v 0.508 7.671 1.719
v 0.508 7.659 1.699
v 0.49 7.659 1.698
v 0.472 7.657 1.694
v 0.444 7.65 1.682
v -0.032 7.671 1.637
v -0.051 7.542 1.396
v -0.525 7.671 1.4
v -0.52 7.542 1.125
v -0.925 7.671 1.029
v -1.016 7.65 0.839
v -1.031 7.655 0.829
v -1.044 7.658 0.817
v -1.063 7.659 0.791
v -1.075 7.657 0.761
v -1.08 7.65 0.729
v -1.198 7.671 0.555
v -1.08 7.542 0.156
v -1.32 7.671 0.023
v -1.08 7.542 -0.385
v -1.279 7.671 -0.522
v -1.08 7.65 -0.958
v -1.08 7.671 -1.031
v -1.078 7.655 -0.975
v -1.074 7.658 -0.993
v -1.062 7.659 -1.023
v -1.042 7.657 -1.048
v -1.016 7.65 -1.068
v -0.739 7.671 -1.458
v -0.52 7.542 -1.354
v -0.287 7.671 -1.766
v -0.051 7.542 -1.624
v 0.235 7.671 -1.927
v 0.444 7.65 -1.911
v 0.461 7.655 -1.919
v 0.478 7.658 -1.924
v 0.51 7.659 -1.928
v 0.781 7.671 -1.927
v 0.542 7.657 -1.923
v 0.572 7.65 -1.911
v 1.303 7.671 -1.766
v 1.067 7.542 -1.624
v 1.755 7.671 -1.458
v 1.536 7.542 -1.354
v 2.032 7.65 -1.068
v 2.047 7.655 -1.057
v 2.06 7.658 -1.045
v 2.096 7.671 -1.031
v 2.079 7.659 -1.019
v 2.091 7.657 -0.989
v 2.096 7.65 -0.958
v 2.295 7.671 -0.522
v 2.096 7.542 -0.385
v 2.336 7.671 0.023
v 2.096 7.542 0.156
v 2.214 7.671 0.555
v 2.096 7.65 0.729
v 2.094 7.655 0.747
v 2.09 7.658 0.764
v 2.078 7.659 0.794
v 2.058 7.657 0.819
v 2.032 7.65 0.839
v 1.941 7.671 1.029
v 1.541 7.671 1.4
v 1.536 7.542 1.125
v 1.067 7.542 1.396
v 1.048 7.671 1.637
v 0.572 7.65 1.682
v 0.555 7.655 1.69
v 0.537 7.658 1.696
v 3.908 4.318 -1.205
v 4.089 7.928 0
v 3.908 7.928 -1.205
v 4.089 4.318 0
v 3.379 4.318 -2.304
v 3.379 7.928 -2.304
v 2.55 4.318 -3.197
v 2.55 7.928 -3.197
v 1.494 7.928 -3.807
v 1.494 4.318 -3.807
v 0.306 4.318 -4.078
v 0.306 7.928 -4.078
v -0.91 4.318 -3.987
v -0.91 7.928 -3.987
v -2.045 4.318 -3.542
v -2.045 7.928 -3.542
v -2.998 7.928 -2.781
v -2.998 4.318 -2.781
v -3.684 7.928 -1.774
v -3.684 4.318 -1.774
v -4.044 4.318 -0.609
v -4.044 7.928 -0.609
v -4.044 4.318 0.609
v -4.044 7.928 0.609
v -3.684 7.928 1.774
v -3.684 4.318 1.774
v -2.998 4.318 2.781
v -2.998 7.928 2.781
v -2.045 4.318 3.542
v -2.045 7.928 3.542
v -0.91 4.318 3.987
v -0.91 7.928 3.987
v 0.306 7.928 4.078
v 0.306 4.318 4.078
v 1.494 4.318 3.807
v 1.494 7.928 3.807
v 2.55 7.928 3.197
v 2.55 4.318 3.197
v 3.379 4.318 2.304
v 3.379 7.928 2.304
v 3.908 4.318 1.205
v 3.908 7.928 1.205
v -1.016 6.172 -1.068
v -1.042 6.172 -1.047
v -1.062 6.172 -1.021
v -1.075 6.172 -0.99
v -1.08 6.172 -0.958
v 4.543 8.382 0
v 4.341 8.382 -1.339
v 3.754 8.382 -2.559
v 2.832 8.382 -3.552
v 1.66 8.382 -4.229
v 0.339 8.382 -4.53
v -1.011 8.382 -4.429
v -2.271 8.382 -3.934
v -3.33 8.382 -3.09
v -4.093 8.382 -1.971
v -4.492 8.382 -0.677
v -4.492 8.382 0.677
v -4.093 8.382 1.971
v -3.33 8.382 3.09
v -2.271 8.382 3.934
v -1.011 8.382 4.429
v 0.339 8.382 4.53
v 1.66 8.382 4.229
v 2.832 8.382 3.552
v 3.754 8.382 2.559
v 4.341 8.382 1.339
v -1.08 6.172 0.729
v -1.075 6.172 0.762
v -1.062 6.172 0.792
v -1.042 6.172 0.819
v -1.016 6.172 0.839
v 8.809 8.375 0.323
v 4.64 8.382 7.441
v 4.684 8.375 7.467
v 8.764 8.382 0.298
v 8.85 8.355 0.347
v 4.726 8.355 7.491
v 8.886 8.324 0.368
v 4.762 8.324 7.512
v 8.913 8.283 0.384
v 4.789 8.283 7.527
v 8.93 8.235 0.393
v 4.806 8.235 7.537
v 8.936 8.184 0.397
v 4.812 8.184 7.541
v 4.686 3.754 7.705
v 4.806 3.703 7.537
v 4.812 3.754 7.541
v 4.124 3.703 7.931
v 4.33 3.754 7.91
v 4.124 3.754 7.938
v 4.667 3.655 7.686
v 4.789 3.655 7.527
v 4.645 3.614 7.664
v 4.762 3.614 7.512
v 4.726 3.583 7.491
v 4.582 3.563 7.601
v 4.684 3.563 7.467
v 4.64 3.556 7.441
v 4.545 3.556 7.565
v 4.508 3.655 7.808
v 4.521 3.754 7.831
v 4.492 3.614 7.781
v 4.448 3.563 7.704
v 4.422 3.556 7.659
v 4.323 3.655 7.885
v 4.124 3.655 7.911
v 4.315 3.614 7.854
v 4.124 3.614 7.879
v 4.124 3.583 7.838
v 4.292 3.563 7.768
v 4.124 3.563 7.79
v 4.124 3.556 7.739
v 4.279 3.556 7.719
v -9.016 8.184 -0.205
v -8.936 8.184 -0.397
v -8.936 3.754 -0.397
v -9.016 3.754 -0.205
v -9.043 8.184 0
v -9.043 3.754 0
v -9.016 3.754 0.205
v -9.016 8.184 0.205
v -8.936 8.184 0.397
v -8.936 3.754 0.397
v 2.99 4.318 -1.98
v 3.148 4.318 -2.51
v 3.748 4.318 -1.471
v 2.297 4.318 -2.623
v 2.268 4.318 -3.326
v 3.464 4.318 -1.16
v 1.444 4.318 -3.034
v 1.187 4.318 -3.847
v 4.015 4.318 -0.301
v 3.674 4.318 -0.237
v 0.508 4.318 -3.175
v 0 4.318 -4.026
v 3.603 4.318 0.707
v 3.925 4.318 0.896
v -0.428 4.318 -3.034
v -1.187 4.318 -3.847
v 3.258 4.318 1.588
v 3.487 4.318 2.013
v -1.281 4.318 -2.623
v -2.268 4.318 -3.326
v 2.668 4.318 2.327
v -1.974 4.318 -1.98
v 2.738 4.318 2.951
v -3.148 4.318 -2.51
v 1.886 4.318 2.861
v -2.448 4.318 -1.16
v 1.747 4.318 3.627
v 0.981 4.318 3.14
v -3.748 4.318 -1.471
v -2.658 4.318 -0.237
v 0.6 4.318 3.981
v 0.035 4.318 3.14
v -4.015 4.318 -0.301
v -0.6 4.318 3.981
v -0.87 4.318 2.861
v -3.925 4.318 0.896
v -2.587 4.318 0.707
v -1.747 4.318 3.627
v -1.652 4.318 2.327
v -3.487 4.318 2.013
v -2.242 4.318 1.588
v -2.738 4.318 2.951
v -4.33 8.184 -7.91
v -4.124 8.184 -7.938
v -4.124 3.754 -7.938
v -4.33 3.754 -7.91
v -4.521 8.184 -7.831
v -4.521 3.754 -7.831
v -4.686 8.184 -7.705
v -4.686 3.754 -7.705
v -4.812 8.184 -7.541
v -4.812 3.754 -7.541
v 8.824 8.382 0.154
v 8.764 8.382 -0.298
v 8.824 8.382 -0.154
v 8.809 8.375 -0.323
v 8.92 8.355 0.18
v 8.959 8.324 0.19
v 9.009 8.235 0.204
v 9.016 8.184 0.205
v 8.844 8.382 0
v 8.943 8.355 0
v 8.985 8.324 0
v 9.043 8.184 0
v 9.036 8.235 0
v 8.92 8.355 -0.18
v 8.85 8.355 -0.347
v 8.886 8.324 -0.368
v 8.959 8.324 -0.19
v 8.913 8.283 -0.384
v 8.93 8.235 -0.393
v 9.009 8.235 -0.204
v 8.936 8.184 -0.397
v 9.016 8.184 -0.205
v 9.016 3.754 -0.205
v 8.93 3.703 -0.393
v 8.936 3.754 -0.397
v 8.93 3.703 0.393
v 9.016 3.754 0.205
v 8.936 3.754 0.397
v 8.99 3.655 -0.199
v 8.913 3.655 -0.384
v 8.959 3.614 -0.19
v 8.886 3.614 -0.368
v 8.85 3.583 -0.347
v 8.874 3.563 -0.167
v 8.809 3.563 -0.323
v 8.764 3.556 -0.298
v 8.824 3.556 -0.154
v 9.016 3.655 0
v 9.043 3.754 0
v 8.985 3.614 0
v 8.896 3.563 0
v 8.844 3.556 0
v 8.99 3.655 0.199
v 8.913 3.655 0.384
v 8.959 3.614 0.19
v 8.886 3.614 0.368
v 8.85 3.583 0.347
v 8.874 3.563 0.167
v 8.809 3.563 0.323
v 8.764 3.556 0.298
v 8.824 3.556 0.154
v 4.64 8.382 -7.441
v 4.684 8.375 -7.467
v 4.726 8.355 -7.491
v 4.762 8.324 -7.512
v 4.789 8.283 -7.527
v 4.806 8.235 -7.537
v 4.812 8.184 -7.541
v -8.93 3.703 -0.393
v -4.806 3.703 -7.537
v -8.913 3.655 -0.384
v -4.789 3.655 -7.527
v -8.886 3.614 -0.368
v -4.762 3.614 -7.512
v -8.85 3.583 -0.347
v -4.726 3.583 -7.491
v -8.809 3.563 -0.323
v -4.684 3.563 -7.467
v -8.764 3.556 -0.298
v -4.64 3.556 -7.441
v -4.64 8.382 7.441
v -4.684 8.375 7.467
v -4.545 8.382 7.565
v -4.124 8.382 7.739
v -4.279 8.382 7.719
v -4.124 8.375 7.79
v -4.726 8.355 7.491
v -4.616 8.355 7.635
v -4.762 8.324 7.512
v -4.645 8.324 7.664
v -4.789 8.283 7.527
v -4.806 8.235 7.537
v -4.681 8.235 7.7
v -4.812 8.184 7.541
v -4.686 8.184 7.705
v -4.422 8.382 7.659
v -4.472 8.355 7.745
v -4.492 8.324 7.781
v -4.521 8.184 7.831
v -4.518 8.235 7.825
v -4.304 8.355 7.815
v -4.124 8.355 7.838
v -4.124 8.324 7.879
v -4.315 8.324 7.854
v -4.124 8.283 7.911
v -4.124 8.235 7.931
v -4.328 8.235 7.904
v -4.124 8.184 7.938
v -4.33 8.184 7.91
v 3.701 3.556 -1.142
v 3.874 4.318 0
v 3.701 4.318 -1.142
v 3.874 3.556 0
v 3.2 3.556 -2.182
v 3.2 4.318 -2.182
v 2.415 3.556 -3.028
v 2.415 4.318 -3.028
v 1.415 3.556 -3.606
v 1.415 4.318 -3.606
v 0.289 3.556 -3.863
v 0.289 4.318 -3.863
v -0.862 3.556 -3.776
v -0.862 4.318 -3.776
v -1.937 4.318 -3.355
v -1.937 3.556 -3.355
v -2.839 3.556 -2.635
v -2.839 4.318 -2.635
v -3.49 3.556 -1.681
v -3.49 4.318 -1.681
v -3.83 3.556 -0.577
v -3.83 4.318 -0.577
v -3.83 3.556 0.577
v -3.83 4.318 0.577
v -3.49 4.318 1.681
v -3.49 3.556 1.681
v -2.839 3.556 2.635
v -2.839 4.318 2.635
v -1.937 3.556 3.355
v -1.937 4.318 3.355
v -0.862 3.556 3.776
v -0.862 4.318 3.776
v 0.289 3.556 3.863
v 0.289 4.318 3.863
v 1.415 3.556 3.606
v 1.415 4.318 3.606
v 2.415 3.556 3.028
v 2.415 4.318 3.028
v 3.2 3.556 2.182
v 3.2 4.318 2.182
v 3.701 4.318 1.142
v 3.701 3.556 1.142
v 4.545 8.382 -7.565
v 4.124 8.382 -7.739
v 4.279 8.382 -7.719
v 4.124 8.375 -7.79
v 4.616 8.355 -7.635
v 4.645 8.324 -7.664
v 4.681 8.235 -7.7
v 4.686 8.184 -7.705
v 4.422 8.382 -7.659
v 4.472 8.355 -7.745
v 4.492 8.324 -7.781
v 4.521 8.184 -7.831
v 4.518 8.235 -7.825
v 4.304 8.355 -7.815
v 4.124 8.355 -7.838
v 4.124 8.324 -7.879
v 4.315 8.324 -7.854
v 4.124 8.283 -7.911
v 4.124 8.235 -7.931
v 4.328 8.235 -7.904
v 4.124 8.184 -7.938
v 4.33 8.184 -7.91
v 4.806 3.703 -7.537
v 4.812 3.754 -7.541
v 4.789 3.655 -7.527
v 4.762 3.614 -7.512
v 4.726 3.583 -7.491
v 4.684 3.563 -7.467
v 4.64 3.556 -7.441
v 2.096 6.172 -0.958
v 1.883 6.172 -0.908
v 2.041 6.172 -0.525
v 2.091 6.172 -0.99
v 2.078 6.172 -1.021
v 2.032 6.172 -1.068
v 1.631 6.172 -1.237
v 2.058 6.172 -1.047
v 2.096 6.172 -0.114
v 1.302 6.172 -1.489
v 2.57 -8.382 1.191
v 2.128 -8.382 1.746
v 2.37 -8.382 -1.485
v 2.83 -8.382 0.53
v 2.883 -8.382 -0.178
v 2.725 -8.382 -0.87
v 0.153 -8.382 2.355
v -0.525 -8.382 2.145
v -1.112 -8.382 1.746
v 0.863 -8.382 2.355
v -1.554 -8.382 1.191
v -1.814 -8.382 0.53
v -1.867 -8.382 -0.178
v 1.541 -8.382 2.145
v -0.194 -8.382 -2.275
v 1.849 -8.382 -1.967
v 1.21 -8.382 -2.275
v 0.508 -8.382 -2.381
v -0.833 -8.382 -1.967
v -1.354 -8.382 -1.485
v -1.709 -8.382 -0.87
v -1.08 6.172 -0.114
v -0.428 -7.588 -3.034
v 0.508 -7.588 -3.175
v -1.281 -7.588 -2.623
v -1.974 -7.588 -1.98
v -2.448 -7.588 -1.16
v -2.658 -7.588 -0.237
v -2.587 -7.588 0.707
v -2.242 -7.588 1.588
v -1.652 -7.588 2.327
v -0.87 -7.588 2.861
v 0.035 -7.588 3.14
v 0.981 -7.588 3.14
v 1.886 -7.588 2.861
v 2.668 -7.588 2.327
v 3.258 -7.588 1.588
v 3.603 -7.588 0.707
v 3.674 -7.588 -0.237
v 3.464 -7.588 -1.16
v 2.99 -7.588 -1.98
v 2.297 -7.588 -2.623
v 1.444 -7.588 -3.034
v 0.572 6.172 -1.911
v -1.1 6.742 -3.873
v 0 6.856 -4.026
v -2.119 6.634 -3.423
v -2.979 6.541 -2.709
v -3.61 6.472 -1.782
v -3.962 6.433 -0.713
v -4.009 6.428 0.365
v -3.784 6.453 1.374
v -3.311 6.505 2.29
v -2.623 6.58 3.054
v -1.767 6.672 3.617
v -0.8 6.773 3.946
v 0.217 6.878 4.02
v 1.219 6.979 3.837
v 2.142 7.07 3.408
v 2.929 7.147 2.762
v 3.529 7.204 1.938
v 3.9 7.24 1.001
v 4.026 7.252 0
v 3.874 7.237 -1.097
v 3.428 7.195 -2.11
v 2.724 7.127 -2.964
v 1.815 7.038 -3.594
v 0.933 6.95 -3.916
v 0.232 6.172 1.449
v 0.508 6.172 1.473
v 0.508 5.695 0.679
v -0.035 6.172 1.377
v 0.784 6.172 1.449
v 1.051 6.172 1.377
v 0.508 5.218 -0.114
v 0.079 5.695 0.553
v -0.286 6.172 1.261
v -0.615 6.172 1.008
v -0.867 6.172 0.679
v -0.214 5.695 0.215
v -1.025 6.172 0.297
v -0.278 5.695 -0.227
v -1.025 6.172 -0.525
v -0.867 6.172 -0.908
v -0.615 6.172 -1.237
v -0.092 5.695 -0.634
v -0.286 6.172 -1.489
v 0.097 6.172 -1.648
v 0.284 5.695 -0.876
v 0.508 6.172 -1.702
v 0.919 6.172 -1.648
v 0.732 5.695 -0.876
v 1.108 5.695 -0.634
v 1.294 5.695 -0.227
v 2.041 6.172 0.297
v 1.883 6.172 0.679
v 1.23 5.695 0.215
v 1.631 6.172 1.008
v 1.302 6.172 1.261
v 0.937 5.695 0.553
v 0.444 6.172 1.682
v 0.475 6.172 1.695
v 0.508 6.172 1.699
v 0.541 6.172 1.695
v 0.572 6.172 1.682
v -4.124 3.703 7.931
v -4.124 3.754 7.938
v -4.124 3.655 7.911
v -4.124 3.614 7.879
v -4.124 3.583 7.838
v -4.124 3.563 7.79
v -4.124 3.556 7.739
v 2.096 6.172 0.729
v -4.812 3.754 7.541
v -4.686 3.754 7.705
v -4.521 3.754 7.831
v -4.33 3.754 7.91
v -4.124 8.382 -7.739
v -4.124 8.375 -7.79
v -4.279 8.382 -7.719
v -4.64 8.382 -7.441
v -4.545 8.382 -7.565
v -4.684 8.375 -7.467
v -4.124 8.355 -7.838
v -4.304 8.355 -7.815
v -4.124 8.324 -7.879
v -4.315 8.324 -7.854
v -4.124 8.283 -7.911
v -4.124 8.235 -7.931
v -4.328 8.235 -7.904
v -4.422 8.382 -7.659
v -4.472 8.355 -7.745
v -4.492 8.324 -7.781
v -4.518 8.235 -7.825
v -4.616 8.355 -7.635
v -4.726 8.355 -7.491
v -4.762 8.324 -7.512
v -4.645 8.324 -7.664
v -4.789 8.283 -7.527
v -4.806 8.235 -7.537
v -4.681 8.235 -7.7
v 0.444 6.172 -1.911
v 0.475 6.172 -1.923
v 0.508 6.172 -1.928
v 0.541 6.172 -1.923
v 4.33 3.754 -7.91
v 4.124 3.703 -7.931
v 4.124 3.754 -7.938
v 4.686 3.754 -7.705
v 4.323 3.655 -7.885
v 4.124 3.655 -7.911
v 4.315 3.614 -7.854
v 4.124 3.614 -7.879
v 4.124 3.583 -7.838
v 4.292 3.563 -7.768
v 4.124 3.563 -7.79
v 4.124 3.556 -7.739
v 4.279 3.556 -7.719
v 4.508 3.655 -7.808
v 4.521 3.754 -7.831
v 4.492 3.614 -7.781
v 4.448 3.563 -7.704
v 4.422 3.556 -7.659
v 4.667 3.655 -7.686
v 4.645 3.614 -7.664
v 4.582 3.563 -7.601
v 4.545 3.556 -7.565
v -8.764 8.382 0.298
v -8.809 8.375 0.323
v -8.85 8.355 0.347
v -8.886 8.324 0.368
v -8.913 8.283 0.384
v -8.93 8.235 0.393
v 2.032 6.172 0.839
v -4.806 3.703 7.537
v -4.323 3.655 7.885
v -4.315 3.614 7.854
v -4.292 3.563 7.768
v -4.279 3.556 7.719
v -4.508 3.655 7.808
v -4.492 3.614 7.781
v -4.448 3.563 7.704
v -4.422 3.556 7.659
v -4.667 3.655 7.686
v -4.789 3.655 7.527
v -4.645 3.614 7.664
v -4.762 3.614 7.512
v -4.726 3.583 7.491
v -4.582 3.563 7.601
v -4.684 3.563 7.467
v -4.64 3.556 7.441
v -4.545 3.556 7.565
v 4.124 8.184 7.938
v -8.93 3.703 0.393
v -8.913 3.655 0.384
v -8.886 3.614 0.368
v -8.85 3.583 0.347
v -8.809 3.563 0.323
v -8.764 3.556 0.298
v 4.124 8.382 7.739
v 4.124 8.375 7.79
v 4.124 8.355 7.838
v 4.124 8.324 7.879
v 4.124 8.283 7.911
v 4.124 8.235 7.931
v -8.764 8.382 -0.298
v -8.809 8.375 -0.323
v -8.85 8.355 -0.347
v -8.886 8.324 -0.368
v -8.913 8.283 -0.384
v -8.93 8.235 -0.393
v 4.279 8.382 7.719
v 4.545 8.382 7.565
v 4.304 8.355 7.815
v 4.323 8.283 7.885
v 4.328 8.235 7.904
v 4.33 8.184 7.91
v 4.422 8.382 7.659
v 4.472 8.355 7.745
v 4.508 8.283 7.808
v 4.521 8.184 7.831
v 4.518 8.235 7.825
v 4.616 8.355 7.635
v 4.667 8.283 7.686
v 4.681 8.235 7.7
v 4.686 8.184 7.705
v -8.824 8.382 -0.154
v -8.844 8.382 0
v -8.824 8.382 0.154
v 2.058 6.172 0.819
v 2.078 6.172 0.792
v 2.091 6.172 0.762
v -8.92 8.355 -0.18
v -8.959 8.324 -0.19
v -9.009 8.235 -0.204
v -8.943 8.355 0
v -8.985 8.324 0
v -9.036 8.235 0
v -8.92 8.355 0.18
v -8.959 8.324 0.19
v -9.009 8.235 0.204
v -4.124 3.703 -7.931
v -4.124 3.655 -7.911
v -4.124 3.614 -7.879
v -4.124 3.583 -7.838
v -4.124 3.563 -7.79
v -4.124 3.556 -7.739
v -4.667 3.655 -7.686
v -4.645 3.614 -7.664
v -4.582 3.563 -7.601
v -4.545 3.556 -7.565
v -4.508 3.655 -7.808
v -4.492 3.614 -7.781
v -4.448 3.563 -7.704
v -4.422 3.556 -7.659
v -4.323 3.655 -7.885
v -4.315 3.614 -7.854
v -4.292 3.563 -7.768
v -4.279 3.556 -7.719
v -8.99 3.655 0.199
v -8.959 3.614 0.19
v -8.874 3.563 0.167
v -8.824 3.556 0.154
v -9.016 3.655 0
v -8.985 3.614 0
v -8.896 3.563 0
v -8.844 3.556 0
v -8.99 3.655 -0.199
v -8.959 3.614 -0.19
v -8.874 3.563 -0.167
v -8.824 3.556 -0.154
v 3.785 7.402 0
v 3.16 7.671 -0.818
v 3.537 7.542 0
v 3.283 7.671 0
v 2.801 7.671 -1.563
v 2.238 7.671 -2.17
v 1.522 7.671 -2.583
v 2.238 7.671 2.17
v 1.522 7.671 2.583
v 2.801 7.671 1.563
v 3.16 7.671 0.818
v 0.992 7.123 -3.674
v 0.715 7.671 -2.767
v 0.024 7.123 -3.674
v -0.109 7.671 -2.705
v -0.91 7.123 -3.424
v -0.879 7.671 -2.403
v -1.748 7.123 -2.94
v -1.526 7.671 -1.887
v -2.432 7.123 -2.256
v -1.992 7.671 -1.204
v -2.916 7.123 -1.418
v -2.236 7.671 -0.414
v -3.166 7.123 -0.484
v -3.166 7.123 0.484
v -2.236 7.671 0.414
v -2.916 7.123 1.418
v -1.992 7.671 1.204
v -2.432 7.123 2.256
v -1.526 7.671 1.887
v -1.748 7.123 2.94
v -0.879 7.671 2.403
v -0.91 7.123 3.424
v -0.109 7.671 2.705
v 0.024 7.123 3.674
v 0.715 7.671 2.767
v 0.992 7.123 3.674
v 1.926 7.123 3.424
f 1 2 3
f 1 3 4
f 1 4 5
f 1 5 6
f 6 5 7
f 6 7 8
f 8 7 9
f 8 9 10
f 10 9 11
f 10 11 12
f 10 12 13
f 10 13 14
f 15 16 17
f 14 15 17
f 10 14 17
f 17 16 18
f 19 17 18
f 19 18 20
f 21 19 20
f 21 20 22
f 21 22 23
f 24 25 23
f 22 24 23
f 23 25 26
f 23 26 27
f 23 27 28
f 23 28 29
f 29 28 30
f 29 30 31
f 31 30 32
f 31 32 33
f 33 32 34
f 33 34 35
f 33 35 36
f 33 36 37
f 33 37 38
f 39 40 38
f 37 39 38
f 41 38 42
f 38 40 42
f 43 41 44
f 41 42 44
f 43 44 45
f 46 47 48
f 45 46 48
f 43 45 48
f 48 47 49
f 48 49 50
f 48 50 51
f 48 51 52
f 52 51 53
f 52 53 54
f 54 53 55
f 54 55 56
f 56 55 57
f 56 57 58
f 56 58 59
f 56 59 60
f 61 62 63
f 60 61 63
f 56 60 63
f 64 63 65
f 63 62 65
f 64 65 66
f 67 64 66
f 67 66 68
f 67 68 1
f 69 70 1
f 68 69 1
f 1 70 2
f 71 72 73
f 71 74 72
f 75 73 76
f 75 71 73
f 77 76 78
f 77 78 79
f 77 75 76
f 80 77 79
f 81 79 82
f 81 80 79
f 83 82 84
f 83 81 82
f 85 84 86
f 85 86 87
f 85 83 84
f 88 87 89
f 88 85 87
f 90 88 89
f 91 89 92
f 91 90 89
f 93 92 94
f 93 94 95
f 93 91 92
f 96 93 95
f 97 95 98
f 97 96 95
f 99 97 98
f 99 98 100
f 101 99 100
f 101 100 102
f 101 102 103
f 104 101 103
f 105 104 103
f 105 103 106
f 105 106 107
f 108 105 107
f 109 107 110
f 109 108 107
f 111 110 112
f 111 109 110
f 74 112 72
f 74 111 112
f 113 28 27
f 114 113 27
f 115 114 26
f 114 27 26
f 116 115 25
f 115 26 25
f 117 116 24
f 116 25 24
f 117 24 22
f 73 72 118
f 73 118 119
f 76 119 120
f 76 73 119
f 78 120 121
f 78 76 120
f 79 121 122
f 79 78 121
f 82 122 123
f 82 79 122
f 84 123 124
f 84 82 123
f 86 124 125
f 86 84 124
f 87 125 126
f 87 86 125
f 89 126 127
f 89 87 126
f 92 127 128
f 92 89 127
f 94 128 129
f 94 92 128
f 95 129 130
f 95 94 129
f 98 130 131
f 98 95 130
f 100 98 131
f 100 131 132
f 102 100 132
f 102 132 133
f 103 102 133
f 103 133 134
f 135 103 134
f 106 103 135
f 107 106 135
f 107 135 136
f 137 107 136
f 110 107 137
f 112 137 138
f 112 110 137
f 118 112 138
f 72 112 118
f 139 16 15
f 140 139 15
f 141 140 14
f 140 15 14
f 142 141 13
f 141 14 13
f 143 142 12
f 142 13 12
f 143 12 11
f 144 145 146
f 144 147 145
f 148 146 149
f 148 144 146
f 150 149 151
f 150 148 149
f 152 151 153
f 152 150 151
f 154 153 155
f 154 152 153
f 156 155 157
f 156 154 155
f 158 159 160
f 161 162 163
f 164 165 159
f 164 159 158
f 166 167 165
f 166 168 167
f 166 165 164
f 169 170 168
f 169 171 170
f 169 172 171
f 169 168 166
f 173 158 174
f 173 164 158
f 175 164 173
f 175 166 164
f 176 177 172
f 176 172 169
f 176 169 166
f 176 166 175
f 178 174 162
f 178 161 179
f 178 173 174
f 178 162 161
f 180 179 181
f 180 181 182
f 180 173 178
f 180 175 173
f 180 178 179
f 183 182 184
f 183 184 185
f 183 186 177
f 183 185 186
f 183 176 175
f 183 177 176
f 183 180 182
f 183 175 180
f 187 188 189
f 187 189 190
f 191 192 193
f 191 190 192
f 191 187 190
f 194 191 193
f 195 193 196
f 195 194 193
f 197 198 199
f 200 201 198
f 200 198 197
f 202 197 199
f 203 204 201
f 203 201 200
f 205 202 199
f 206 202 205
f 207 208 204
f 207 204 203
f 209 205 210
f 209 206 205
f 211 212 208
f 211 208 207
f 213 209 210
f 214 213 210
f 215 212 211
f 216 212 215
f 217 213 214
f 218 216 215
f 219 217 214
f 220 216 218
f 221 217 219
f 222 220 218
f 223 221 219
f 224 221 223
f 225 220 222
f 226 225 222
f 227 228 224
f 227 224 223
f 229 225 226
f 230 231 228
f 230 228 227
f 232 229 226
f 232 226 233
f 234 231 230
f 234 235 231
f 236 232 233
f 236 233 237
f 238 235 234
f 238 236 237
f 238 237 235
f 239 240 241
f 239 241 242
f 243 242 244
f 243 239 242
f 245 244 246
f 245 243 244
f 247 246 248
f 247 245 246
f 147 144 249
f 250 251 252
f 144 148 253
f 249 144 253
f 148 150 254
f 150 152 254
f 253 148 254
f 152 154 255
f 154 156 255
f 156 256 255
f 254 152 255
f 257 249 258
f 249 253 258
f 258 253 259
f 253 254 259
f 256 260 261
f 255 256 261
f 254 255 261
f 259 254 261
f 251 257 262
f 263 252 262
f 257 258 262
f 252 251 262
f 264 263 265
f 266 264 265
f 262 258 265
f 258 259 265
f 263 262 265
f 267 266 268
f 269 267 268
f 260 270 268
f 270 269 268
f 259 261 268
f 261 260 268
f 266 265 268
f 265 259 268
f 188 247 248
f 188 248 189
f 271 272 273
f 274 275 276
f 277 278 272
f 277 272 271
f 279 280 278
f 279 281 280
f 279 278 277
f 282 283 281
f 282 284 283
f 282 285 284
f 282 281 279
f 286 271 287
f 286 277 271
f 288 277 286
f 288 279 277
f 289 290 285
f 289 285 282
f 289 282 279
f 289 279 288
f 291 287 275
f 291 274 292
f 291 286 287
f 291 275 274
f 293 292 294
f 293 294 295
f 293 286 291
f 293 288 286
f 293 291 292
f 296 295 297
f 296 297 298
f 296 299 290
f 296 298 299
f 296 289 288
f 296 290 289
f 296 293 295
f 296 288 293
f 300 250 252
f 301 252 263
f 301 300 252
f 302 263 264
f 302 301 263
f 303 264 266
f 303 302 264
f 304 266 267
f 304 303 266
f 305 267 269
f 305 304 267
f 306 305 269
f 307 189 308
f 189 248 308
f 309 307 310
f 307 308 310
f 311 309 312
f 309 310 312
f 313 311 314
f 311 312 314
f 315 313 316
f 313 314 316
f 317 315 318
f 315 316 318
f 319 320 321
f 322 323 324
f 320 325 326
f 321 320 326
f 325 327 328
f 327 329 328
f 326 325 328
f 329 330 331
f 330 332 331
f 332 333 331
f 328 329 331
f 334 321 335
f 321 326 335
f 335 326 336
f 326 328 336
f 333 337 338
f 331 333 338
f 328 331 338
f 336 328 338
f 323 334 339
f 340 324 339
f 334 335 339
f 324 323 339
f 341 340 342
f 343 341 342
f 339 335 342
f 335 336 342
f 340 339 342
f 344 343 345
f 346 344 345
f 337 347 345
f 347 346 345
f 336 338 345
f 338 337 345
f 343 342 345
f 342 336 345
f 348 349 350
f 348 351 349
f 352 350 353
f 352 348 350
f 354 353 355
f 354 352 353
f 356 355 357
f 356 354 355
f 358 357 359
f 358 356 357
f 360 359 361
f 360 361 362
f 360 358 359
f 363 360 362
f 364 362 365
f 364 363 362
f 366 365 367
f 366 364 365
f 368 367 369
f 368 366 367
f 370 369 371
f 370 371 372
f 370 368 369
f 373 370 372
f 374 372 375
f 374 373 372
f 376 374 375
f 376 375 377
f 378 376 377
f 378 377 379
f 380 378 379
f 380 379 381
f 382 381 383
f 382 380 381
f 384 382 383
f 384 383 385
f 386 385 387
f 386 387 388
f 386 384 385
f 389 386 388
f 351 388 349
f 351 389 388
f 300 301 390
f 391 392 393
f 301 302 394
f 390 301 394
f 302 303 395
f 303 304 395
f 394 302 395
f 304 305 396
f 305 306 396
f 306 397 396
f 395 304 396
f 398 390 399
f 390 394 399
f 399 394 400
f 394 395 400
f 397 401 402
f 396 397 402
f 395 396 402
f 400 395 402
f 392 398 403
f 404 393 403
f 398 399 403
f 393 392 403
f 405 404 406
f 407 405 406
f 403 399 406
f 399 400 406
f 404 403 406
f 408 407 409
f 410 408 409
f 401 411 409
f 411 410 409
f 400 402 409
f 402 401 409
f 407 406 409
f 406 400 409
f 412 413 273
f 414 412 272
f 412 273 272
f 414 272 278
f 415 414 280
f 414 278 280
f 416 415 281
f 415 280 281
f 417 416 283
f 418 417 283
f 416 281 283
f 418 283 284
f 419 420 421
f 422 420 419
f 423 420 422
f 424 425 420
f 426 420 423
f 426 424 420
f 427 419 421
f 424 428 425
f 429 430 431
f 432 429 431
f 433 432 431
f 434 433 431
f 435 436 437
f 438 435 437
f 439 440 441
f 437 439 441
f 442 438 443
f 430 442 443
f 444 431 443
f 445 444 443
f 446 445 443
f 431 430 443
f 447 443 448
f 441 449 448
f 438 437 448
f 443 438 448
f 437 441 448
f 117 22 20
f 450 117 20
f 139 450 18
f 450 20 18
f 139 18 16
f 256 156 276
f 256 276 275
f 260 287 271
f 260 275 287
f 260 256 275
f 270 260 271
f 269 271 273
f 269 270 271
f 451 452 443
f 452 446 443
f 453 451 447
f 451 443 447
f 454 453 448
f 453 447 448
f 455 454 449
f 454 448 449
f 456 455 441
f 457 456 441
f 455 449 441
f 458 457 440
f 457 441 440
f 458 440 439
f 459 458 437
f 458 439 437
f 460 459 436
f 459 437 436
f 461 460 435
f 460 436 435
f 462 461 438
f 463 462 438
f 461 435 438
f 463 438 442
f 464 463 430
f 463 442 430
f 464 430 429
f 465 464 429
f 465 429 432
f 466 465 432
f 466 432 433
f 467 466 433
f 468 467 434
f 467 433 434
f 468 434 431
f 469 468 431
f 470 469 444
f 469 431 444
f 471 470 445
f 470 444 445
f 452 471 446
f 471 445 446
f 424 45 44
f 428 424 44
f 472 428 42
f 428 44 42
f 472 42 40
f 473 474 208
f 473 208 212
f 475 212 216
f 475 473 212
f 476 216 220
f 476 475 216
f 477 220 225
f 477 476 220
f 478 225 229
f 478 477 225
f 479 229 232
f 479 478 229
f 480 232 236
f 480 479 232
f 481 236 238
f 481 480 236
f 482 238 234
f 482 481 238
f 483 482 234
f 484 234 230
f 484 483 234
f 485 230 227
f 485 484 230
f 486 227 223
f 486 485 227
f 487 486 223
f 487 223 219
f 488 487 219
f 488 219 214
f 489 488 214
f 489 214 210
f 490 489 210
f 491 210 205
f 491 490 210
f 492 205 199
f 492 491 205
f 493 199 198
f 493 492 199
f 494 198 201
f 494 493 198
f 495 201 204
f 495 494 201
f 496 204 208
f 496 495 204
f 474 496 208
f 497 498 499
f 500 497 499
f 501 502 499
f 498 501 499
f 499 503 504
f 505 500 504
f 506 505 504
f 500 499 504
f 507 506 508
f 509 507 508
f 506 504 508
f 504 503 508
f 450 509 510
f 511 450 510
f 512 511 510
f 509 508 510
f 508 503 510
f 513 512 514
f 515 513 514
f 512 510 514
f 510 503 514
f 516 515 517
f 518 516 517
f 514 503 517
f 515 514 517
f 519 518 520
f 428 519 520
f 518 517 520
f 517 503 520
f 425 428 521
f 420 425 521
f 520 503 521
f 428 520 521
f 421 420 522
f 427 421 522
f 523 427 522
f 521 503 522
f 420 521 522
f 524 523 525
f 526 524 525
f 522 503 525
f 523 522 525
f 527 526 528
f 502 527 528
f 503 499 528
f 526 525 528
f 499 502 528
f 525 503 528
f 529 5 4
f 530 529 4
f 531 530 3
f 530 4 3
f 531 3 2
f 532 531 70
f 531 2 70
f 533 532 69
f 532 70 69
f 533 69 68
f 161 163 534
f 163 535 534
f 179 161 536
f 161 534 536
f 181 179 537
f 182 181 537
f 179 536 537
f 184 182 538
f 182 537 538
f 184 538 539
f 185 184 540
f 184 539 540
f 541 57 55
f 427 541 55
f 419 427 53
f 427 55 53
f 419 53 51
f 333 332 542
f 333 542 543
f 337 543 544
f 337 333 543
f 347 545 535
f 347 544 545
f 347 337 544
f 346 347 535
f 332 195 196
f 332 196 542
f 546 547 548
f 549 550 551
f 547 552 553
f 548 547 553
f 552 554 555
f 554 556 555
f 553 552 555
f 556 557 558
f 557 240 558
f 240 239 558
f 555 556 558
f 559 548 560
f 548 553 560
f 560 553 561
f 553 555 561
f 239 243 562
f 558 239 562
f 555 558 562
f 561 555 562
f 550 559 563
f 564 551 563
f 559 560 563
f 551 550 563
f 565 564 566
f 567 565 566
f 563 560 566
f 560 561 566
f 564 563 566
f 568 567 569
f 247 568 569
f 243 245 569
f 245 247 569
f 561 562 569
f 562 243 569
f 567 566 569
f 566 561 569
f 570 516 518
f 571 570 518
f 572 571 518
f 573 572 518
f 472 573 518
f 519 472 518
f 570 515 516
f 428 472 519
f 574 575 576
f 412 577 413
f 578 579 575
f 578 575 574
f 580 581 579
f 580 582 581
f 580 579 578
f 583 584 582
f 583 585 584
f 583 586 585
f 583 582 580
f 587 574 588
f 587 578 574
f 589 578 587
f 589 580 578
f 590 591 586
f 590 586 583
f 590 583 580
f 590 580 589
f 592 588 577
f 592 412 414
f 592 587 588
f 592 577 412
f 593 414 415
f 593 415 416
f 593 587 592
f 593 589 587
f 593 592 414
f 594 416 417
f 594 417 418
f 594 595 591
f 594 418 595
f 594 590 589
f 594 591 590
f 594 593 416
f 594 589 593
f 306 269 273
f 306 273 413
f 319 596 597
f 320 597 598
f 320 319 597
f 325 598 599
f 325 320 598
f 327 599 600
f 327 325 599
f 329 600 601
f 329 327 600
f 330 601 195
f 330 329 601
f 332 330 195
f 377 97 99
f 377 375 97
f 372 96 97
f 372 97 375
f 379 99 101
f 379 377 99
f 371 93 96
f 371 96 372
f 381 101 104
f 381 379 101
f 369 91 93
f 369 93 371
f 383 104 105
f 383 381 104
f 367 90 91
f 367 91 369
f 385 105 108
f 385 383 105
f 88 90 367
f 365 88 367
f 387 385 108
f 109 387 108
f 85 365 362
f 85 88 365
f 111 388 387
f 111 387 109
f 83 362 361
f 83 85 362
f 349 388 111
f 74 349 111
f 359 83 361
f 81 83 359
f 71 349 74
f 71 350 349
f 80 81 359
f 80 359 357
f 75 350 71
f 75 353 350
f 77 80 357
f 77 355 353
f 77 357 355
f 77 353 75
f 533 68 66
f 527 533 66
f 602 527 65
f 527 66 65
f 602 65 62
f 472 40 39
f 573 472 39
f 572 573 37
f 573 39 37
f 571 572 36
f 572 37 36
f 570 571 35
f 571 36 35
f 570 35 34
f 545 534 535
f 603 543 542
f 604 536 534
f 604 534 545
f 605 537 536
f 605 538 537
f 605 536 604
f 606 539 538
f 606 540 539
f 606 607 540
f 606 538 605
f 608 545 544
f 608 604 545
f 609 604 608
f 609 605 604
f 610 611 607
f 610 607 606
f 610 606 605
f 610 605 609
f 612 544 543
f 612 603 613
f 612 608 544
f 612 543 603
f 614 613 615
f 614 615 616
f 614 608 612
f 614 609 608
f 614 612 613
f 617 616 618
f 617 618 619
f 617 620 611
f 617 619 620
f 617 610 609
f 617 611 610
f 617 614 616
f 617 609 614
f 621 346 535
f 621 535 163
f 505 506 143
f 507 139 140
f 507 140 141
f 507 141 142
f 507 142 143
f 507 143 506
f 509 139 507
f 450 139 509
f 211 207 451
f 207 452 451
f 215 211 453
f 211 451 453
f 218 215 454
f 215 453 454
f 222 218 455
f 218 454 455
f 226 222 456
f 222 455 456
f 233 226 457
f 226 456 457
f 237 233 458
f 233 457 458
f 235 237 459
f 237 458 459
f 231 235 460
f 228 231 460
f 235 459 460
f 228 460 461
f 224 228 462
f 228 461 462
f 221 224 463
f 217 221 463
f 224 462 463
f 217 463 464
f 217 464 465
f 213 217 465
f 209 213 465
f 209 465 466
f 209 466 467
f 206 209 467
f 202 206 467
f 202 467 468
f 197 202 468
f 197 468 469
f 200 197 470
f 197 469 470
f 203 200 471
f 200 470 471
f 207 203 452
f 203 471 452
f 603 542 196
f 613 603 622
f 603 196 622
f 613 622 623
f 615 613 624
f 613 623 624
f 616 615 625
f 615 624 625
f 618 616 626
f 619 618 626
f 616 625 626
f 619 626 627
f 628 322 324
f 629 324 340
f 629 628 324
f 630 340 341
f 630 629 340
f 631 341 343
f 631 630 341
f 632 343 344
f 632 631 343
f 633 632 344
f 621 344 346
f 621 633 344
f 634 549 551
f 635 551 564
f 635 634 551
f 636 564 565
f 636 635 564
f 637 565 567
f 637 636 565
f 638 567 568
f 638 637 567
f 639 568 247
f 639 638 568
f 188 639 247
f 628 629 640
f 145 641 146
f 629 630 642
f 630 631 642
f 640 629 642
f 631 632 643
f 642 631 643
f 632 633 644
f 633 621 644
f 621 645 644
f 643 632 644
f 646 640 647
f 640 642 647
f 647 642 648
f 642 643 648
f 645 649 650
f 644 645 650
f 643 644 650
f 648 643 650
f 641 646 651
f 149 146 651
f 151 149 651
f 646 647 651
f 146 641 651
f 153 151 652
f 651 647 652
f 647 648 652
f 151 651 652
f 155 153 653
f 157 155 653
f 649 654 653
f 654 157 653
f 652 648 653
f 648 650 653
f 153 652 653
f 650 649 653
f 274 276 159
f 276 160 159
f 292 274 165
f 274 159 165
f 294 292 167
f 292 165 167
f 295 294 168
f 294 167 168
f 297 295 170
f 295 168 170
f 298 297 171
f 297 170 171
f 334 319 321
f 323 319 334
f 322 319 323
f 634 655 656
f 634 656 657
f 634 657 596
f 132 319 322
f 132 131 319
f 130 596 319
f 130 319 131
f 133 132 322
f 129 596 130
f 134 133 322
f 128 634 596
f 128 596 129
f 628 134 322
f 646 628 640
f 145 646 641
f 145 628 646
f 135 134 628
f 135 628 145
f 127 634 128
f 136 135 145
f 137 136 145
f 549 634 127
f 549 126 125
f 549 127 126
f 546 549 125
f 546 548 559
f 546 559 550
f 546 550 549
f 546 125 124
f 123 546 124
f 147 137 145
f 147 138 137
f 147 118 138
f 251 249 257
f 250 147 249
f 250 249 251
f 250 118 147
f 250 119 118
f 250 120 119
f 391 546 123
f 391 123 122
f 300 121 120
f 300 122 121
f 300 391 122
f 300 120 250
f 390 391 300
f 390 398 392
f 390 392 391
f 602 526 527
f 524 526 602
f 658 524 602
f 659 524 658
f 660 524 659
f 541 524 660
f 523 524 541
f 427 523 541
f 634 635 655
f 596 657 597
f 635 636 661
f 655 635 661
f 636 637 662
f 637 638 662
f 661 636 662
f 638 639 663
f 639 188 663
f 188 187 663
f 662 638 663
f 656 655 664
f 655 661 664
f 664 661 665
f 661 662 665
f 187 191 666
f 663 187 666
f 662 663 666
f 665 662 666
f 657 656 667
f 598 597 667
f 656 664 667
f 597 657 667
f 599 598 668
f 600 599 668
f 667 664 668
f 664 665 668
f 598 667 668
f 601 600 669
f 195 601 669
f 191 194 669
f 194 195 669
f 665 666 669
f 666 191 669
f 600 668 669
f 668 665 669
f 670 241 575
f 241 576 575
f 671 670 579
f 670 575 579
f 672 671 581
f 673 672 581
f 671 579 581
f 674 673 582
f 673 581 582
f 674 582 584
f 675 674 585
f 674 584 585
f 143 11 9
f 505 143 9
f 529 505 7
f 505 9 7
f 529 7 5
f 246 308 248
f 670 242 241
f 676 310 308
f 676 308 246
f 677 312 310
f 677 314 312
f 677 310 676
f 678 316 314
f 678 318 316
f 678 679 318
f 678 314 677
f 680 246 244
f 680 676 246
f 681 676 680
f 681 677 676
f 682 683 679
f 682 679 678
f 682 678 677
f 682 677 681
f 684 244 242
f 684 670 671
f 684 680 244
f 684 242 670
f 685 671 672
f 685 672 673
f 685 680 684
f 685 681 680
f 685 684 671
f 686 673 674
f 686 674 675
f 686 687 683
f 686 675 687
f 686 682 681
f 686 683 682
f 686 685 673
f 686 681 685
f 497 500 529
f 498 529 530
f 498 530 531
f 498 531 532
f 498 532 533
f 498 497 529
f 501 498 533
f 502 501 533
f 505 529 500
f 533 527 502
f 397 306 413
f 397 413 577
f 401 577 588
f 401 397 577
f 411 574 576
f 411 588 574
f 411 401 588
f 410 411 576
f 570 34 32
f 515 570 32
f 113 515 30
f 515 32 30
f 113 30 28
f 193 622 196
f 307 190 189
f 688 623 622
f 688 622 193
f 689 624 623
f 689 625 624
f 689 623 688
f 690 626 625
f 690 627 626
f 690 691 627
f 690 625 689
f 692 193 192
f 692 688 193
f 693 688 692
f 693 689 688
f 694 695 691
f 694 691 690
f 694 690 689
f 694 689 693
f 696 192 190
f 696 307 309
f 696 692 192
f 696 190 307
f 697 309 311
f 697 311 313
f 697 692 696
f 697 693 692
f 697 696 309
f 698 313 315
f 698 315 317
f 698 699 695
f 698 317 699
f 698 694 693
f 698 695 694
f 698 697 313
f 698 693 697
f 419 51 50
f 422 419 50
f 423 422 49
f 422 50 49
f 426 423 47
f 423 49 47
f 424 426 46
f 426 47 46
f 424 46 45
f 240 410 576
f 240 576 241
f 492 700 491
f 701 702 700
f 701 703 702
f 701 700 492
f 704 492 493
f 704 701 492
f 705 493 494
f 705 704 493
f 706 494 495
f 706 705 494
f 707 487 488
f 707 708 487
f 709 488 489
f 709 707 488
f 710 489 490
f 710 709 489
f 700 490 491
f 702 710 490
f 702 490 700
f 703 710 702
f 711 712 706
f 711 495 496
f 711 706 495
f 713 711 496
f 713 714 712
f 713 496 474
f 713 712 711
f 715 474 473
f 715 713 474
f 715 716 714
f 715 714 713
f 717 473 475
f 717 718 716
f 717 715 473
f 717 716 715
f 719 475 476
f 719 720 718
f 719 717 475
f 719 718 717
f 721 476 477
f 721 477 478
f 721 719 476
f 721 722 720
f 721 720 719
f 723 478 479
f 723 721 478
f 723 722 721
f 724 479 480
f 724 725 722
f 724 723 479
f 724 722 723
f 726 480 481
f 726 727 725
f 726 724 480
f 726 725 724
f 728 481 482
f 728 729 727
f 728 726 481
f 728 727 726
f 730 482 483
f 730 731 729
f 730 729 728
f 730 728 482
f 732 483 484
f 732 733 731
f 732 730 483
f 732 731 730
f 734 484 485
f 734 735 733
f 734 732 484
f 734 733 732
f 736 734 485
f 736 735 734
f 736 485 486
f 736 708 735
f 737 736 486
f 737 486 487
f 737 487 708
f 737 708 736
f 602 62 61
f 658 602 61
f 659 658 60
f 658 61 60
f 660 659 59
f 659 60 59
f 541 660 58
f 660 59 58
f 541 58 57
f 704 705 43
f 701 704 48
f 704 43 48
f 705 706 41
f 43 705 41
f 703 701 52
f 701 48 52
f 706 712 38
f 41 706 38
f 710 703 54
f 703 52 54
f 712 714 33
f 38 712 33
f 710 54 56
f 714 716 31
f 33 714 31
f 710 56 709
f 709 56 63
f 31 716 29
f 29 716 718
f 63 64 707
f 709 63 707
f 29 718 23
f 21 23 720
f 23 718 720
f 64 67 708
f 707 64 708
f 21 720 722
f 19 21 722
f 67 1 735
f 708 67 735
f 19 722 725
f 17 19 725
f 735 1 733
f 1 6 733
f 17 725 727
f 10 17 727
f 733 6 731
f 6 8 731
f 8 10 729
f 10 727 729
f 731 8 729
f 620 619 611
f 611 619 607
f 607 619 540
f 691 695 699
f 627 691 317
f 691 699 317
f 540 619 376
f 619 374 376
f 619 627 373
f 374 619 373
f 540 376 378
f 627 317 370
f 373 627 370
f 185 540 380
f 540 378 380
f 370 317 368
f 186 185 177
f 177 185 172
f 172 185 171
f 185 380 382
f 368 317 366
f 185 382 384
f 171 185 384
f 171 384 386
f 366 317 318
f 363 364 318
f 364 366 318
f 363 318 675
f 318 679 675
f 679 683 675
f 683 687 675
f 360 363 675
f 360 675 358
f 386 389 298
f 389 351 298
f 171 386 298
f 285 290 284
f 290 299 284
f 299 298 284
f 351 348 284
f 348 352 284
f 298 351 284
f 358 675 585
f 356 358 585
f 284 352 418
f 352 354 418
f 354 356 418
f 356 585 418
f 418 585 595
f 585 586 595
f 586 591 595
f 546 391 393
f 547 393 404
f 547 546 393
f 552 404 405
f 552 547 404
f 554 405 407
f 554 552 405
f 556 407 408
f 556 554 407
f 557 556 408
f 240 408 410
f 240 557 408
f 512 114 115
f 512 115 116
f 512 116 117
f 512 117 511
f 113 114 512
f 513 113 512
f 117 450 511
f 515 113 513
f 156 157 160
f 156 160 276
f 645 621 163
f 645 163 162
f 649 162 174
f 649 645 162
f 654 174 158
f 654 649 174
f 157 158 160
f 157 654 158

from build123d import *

# Parameters (mm, degrees)
SKETCH4_R           = 4.542971429
BOSS_EXTRUDE1_DEPTH = 4.826
FILLET1_R           = 0.1984375
SKETCH5_W           = 4.0259
SKETCH5_H           = 3.3528
CUT_EXTRUDE1_DEPTH  = 1.4986


with BuildPart() as part:
    # Sketch3 → Revolve1 (revolve)
    with BuildSketch(Plane.XY, mode=Mode.PRIVATE) as revolve1_sk:
        Polygon((-4.542971429, 8.382), (-4.0894, 7.928428571), (-4.0894, 4.318), (-3.8735, 4.318), (-3.8735, 3.556), (-7.9375, 3.556), (-7.9375, 8.382), align=None)
    revolve(revolve1_sk.sketch.rotate(Axis((0, -8.382, 0), (0, 1, 0)), 180), axis=Axis((0, -8.382, 0), (0, 1, 0)))

    # Sketch4 → Boss-Extrude1 (add)
    with BuildSketch(Plane(origin=(0, 8.382, 0), x_dir=(1, 0, 0), z_dir=(0, 1, 0))):
        with BuildLine():
            Line((4.124445986, 7.9375), (-4.124445986, 7.9375))
            ThreePointArc((-4.124445986, 7.9375), (-4.521320986, 7.831157664), (-4.81185365, 7.540625))
            Line((-4.81185365, 7.540625), (-8.936299635, 0.396875))
            ThreePointArc((-8.936299635, 0.396875), (-9.042641971, 0), (-8.936299635, -0.396875))
            Line((-8.936299635, -0.396875), (-4.81185365, -7.540625))
            ThreePointArc((-4.81185365, -7.540625), (-4.521320986, -7.831157664), (-4.124445986, -7.9375))
            Line((-4.124445986, -7.9375), (4.124445986, -7.9375))
            ThreePointArc((4.124445986, -7.9375), (4.521320986, -7.831157664), (4.81185365, -7.540625))
            Line((4.81185365, -7.540625), (8.936299635, -0.396875))
            ThreePointArc((8.936299635, -0.396875), (9.042641971, 0), (8.936299635, 0.396875))
            Line((8.936299635, 0.396875), (4.81185365, 7.540625))
            ThreePointArc((4.81185365, 7.540625), (4.521320986, 7.831157664), (4.124445986, 7.9375))
        make_face()
        Circle(SKETCH4_R, mode=Mode.SUBTRACT)
    extrude(amount=-BOSS_EXTRUDE1_DEPTH)

    # Fillet1
    fillet1_edges = [part.edges().sort_by_distance(p)[0] for p in [
        (-6.874076643, 3.556, 3.96875),
        (0, 3.556, 7.9375),
        (-4.521320986, 3.556, 7.831157664),
        (6.874076643, 3.556, 3.96875),
        (4.521320986, 3.556, 7.831157664),
        (6.874076643, 3.556, -3.96875),
        (9.042641971, 3.556, 0),
        (0, 3.556, -7.9375),
        (4.521320986, 3.556, -7.831157664),
        (-6.874076643, 3.556, -3.96875),
        (-4.521320986, 3.556, -7.831157664),
        (6.874076643, 8.382, 3.96875),
        (0, 8.382, 7.9375),
        (4.521320986, 8.382, 7.831157664),
        (-6.874076643, 8.382, 3.96875),
        (-4.521320986, 8.382, 7.831157664),
        (-6.874076643, 8.382, -3.96875),
        (-9.042641971, 8.382, 0),
        (0, 8.382, -7.9375),
        (-4.521320986, 8.382, -7.831157664),
        (6.874076643, 8.382, -3.96875),
        (4.521320986, 8.382, -7.831157664),
        (9.042641971, 8.382, 0),
        (-9.042641971, 3.556, 0),
    ]]
    fillet(fillet1_edges, radius=FILLET1_R)


with BuildPart() as body_2:
    # Sketch5 → Revolve2 (revolve)
    with BuildSketch(Plane.XY, mode=Mode.PRIVATE) as revolve2_sk:
        with Locations((2.01295, 5.9944)):
            Rectangle(SKETCH5_W, SKETCH5_H)
    revolve(revolve2_sk.sketch.rotate(Axis((0, 4.318, 0), (0, 1, 0)), 90), axis=Axis((0, 4.318, 0), (0, 1, 0)))

    # Sketch6 → Revolve3 (revolve)
    with BuildSketch(Plane.XY, mode=Mode.PRIVATE) as revolve3_sk:
        Polygon((0.508, 4.318), (3.683, 4.318), (3.683, -7.58825), (2.88925, -8.382), (0.508, -8.382), align=None)
    revolve(revolve3_sk.sketch.rotate(Axis((0.508, -8.382, 0), (0, 1, 0)), 90), axis=Axis((0.508, -8.382, 0), (0, 1, 0)))

    # Sketch7 → Cut-Revolve1 (revolve, cut)
    with BuildSketch(Plane.XY):
        with BuildLine():
            Line((6.703000764, 13.127905926), (6.703000764, 3.556))
            ThreePointArc((6.703000764, 3.556), (4.409975702, 6.979063374), (0.508, 8.301905926))
            Line((0.508, 8.301905926), (0.508, 13.127905926))
            Line((0.508, 13.127905926), (6.703000764, 13.127905926))
        make_face()
    revolve(axis=Axis((0.508, -8.382, 0), (0, 1, 0)), mode=Mode.SUBTRACT)

    # Sketch8 → Cut-Extrude1 (cut)
    with BuildSketch(Plane(origin=(0, 7.6708, 0), x_dir=(1, 0, 0), z_dir=(0, 1, 0))):
        with BuildLine():
            Line((-1.016, -0.838905294), (0.4445, -1.682125363))
            ThreePointArc((0.4445, -1.682125363), (0.508, -1.699140136), (0.5715, -1.682125363))
            Line((0.5715, -1.682125363), (2.032, -0.838905294))
            ThreePointArc((2.032, -0.838905294), (2.078485226, -0.792420068), (2.0955, -0.728920068))
            Line((2.0955, -0.728920068), (2.0955, 0.957520068))
            ThreePointArc((2.0955, 0.957520068), (2.078485226, 1.021020068), (2.032, 1.067505294))
            Line((2.032, 1.067505294), (0.5715, 1.910725363))
            ThreePointArc((0.5715, 1.910725363), (0.508, 1.927740136), (0.4445, 1.910725363))
            Line((0.4445, 1.910725363), (-1.016, 1.067505294))
            ThreePointArc((-1.016, 1.067505294), (-1.062485226, 1.021020068), (-1.0795, 0.957520068))
            Line((-1.0795, 0.957520068), (-1.0795, -0.728920068))
            ThreePointArc((-1.0795, -0.728920068), (-1.062485226, -0.792420068), (-1.016, -0.838905294))
        make_face()
    extrude(amount=-CUT_EXTRUDE1_DEPTH, mode=Mode.SUBTRACT)

    # Cut-Extrude2 cone 1 section (through the dimple's axis) → Cut-Extrude2 (revolve, cut)
    with BuildSketch(Plane(origin=(0.508, 6.1722, -0.1143), x_dir=(0, 0, 1), z_dir=(1, 0, 0))):
        Polygon((0, 0), (1.5875, 0), (0, 0.953866233), align=None)
    revolve(axis=Axis((0.508, 6.1722, -0.1143), (0, -1, 0)), mode=Mode.SUBTRACT)

    # Cut-Extrude3 cone 1 section (through the dimple's axis) → Cut-Extrude3 (revolve, cut)
    with BuildSketch(Plane(origin=(0.508, 7.6708, -0.1143), x_dir=(0, 0, 1), z_dir=(1, 0, 0))):
        Polygon((0, 0), (1.833087105, 0), (0, 1.058333333), align=None)
    revolve(axis=Axis((0.508, 7.6708, -0.1143), (0, -1, 0)), mode=Mode.SUBTRACT)


solid = Compound([part.part, body_2.part])
